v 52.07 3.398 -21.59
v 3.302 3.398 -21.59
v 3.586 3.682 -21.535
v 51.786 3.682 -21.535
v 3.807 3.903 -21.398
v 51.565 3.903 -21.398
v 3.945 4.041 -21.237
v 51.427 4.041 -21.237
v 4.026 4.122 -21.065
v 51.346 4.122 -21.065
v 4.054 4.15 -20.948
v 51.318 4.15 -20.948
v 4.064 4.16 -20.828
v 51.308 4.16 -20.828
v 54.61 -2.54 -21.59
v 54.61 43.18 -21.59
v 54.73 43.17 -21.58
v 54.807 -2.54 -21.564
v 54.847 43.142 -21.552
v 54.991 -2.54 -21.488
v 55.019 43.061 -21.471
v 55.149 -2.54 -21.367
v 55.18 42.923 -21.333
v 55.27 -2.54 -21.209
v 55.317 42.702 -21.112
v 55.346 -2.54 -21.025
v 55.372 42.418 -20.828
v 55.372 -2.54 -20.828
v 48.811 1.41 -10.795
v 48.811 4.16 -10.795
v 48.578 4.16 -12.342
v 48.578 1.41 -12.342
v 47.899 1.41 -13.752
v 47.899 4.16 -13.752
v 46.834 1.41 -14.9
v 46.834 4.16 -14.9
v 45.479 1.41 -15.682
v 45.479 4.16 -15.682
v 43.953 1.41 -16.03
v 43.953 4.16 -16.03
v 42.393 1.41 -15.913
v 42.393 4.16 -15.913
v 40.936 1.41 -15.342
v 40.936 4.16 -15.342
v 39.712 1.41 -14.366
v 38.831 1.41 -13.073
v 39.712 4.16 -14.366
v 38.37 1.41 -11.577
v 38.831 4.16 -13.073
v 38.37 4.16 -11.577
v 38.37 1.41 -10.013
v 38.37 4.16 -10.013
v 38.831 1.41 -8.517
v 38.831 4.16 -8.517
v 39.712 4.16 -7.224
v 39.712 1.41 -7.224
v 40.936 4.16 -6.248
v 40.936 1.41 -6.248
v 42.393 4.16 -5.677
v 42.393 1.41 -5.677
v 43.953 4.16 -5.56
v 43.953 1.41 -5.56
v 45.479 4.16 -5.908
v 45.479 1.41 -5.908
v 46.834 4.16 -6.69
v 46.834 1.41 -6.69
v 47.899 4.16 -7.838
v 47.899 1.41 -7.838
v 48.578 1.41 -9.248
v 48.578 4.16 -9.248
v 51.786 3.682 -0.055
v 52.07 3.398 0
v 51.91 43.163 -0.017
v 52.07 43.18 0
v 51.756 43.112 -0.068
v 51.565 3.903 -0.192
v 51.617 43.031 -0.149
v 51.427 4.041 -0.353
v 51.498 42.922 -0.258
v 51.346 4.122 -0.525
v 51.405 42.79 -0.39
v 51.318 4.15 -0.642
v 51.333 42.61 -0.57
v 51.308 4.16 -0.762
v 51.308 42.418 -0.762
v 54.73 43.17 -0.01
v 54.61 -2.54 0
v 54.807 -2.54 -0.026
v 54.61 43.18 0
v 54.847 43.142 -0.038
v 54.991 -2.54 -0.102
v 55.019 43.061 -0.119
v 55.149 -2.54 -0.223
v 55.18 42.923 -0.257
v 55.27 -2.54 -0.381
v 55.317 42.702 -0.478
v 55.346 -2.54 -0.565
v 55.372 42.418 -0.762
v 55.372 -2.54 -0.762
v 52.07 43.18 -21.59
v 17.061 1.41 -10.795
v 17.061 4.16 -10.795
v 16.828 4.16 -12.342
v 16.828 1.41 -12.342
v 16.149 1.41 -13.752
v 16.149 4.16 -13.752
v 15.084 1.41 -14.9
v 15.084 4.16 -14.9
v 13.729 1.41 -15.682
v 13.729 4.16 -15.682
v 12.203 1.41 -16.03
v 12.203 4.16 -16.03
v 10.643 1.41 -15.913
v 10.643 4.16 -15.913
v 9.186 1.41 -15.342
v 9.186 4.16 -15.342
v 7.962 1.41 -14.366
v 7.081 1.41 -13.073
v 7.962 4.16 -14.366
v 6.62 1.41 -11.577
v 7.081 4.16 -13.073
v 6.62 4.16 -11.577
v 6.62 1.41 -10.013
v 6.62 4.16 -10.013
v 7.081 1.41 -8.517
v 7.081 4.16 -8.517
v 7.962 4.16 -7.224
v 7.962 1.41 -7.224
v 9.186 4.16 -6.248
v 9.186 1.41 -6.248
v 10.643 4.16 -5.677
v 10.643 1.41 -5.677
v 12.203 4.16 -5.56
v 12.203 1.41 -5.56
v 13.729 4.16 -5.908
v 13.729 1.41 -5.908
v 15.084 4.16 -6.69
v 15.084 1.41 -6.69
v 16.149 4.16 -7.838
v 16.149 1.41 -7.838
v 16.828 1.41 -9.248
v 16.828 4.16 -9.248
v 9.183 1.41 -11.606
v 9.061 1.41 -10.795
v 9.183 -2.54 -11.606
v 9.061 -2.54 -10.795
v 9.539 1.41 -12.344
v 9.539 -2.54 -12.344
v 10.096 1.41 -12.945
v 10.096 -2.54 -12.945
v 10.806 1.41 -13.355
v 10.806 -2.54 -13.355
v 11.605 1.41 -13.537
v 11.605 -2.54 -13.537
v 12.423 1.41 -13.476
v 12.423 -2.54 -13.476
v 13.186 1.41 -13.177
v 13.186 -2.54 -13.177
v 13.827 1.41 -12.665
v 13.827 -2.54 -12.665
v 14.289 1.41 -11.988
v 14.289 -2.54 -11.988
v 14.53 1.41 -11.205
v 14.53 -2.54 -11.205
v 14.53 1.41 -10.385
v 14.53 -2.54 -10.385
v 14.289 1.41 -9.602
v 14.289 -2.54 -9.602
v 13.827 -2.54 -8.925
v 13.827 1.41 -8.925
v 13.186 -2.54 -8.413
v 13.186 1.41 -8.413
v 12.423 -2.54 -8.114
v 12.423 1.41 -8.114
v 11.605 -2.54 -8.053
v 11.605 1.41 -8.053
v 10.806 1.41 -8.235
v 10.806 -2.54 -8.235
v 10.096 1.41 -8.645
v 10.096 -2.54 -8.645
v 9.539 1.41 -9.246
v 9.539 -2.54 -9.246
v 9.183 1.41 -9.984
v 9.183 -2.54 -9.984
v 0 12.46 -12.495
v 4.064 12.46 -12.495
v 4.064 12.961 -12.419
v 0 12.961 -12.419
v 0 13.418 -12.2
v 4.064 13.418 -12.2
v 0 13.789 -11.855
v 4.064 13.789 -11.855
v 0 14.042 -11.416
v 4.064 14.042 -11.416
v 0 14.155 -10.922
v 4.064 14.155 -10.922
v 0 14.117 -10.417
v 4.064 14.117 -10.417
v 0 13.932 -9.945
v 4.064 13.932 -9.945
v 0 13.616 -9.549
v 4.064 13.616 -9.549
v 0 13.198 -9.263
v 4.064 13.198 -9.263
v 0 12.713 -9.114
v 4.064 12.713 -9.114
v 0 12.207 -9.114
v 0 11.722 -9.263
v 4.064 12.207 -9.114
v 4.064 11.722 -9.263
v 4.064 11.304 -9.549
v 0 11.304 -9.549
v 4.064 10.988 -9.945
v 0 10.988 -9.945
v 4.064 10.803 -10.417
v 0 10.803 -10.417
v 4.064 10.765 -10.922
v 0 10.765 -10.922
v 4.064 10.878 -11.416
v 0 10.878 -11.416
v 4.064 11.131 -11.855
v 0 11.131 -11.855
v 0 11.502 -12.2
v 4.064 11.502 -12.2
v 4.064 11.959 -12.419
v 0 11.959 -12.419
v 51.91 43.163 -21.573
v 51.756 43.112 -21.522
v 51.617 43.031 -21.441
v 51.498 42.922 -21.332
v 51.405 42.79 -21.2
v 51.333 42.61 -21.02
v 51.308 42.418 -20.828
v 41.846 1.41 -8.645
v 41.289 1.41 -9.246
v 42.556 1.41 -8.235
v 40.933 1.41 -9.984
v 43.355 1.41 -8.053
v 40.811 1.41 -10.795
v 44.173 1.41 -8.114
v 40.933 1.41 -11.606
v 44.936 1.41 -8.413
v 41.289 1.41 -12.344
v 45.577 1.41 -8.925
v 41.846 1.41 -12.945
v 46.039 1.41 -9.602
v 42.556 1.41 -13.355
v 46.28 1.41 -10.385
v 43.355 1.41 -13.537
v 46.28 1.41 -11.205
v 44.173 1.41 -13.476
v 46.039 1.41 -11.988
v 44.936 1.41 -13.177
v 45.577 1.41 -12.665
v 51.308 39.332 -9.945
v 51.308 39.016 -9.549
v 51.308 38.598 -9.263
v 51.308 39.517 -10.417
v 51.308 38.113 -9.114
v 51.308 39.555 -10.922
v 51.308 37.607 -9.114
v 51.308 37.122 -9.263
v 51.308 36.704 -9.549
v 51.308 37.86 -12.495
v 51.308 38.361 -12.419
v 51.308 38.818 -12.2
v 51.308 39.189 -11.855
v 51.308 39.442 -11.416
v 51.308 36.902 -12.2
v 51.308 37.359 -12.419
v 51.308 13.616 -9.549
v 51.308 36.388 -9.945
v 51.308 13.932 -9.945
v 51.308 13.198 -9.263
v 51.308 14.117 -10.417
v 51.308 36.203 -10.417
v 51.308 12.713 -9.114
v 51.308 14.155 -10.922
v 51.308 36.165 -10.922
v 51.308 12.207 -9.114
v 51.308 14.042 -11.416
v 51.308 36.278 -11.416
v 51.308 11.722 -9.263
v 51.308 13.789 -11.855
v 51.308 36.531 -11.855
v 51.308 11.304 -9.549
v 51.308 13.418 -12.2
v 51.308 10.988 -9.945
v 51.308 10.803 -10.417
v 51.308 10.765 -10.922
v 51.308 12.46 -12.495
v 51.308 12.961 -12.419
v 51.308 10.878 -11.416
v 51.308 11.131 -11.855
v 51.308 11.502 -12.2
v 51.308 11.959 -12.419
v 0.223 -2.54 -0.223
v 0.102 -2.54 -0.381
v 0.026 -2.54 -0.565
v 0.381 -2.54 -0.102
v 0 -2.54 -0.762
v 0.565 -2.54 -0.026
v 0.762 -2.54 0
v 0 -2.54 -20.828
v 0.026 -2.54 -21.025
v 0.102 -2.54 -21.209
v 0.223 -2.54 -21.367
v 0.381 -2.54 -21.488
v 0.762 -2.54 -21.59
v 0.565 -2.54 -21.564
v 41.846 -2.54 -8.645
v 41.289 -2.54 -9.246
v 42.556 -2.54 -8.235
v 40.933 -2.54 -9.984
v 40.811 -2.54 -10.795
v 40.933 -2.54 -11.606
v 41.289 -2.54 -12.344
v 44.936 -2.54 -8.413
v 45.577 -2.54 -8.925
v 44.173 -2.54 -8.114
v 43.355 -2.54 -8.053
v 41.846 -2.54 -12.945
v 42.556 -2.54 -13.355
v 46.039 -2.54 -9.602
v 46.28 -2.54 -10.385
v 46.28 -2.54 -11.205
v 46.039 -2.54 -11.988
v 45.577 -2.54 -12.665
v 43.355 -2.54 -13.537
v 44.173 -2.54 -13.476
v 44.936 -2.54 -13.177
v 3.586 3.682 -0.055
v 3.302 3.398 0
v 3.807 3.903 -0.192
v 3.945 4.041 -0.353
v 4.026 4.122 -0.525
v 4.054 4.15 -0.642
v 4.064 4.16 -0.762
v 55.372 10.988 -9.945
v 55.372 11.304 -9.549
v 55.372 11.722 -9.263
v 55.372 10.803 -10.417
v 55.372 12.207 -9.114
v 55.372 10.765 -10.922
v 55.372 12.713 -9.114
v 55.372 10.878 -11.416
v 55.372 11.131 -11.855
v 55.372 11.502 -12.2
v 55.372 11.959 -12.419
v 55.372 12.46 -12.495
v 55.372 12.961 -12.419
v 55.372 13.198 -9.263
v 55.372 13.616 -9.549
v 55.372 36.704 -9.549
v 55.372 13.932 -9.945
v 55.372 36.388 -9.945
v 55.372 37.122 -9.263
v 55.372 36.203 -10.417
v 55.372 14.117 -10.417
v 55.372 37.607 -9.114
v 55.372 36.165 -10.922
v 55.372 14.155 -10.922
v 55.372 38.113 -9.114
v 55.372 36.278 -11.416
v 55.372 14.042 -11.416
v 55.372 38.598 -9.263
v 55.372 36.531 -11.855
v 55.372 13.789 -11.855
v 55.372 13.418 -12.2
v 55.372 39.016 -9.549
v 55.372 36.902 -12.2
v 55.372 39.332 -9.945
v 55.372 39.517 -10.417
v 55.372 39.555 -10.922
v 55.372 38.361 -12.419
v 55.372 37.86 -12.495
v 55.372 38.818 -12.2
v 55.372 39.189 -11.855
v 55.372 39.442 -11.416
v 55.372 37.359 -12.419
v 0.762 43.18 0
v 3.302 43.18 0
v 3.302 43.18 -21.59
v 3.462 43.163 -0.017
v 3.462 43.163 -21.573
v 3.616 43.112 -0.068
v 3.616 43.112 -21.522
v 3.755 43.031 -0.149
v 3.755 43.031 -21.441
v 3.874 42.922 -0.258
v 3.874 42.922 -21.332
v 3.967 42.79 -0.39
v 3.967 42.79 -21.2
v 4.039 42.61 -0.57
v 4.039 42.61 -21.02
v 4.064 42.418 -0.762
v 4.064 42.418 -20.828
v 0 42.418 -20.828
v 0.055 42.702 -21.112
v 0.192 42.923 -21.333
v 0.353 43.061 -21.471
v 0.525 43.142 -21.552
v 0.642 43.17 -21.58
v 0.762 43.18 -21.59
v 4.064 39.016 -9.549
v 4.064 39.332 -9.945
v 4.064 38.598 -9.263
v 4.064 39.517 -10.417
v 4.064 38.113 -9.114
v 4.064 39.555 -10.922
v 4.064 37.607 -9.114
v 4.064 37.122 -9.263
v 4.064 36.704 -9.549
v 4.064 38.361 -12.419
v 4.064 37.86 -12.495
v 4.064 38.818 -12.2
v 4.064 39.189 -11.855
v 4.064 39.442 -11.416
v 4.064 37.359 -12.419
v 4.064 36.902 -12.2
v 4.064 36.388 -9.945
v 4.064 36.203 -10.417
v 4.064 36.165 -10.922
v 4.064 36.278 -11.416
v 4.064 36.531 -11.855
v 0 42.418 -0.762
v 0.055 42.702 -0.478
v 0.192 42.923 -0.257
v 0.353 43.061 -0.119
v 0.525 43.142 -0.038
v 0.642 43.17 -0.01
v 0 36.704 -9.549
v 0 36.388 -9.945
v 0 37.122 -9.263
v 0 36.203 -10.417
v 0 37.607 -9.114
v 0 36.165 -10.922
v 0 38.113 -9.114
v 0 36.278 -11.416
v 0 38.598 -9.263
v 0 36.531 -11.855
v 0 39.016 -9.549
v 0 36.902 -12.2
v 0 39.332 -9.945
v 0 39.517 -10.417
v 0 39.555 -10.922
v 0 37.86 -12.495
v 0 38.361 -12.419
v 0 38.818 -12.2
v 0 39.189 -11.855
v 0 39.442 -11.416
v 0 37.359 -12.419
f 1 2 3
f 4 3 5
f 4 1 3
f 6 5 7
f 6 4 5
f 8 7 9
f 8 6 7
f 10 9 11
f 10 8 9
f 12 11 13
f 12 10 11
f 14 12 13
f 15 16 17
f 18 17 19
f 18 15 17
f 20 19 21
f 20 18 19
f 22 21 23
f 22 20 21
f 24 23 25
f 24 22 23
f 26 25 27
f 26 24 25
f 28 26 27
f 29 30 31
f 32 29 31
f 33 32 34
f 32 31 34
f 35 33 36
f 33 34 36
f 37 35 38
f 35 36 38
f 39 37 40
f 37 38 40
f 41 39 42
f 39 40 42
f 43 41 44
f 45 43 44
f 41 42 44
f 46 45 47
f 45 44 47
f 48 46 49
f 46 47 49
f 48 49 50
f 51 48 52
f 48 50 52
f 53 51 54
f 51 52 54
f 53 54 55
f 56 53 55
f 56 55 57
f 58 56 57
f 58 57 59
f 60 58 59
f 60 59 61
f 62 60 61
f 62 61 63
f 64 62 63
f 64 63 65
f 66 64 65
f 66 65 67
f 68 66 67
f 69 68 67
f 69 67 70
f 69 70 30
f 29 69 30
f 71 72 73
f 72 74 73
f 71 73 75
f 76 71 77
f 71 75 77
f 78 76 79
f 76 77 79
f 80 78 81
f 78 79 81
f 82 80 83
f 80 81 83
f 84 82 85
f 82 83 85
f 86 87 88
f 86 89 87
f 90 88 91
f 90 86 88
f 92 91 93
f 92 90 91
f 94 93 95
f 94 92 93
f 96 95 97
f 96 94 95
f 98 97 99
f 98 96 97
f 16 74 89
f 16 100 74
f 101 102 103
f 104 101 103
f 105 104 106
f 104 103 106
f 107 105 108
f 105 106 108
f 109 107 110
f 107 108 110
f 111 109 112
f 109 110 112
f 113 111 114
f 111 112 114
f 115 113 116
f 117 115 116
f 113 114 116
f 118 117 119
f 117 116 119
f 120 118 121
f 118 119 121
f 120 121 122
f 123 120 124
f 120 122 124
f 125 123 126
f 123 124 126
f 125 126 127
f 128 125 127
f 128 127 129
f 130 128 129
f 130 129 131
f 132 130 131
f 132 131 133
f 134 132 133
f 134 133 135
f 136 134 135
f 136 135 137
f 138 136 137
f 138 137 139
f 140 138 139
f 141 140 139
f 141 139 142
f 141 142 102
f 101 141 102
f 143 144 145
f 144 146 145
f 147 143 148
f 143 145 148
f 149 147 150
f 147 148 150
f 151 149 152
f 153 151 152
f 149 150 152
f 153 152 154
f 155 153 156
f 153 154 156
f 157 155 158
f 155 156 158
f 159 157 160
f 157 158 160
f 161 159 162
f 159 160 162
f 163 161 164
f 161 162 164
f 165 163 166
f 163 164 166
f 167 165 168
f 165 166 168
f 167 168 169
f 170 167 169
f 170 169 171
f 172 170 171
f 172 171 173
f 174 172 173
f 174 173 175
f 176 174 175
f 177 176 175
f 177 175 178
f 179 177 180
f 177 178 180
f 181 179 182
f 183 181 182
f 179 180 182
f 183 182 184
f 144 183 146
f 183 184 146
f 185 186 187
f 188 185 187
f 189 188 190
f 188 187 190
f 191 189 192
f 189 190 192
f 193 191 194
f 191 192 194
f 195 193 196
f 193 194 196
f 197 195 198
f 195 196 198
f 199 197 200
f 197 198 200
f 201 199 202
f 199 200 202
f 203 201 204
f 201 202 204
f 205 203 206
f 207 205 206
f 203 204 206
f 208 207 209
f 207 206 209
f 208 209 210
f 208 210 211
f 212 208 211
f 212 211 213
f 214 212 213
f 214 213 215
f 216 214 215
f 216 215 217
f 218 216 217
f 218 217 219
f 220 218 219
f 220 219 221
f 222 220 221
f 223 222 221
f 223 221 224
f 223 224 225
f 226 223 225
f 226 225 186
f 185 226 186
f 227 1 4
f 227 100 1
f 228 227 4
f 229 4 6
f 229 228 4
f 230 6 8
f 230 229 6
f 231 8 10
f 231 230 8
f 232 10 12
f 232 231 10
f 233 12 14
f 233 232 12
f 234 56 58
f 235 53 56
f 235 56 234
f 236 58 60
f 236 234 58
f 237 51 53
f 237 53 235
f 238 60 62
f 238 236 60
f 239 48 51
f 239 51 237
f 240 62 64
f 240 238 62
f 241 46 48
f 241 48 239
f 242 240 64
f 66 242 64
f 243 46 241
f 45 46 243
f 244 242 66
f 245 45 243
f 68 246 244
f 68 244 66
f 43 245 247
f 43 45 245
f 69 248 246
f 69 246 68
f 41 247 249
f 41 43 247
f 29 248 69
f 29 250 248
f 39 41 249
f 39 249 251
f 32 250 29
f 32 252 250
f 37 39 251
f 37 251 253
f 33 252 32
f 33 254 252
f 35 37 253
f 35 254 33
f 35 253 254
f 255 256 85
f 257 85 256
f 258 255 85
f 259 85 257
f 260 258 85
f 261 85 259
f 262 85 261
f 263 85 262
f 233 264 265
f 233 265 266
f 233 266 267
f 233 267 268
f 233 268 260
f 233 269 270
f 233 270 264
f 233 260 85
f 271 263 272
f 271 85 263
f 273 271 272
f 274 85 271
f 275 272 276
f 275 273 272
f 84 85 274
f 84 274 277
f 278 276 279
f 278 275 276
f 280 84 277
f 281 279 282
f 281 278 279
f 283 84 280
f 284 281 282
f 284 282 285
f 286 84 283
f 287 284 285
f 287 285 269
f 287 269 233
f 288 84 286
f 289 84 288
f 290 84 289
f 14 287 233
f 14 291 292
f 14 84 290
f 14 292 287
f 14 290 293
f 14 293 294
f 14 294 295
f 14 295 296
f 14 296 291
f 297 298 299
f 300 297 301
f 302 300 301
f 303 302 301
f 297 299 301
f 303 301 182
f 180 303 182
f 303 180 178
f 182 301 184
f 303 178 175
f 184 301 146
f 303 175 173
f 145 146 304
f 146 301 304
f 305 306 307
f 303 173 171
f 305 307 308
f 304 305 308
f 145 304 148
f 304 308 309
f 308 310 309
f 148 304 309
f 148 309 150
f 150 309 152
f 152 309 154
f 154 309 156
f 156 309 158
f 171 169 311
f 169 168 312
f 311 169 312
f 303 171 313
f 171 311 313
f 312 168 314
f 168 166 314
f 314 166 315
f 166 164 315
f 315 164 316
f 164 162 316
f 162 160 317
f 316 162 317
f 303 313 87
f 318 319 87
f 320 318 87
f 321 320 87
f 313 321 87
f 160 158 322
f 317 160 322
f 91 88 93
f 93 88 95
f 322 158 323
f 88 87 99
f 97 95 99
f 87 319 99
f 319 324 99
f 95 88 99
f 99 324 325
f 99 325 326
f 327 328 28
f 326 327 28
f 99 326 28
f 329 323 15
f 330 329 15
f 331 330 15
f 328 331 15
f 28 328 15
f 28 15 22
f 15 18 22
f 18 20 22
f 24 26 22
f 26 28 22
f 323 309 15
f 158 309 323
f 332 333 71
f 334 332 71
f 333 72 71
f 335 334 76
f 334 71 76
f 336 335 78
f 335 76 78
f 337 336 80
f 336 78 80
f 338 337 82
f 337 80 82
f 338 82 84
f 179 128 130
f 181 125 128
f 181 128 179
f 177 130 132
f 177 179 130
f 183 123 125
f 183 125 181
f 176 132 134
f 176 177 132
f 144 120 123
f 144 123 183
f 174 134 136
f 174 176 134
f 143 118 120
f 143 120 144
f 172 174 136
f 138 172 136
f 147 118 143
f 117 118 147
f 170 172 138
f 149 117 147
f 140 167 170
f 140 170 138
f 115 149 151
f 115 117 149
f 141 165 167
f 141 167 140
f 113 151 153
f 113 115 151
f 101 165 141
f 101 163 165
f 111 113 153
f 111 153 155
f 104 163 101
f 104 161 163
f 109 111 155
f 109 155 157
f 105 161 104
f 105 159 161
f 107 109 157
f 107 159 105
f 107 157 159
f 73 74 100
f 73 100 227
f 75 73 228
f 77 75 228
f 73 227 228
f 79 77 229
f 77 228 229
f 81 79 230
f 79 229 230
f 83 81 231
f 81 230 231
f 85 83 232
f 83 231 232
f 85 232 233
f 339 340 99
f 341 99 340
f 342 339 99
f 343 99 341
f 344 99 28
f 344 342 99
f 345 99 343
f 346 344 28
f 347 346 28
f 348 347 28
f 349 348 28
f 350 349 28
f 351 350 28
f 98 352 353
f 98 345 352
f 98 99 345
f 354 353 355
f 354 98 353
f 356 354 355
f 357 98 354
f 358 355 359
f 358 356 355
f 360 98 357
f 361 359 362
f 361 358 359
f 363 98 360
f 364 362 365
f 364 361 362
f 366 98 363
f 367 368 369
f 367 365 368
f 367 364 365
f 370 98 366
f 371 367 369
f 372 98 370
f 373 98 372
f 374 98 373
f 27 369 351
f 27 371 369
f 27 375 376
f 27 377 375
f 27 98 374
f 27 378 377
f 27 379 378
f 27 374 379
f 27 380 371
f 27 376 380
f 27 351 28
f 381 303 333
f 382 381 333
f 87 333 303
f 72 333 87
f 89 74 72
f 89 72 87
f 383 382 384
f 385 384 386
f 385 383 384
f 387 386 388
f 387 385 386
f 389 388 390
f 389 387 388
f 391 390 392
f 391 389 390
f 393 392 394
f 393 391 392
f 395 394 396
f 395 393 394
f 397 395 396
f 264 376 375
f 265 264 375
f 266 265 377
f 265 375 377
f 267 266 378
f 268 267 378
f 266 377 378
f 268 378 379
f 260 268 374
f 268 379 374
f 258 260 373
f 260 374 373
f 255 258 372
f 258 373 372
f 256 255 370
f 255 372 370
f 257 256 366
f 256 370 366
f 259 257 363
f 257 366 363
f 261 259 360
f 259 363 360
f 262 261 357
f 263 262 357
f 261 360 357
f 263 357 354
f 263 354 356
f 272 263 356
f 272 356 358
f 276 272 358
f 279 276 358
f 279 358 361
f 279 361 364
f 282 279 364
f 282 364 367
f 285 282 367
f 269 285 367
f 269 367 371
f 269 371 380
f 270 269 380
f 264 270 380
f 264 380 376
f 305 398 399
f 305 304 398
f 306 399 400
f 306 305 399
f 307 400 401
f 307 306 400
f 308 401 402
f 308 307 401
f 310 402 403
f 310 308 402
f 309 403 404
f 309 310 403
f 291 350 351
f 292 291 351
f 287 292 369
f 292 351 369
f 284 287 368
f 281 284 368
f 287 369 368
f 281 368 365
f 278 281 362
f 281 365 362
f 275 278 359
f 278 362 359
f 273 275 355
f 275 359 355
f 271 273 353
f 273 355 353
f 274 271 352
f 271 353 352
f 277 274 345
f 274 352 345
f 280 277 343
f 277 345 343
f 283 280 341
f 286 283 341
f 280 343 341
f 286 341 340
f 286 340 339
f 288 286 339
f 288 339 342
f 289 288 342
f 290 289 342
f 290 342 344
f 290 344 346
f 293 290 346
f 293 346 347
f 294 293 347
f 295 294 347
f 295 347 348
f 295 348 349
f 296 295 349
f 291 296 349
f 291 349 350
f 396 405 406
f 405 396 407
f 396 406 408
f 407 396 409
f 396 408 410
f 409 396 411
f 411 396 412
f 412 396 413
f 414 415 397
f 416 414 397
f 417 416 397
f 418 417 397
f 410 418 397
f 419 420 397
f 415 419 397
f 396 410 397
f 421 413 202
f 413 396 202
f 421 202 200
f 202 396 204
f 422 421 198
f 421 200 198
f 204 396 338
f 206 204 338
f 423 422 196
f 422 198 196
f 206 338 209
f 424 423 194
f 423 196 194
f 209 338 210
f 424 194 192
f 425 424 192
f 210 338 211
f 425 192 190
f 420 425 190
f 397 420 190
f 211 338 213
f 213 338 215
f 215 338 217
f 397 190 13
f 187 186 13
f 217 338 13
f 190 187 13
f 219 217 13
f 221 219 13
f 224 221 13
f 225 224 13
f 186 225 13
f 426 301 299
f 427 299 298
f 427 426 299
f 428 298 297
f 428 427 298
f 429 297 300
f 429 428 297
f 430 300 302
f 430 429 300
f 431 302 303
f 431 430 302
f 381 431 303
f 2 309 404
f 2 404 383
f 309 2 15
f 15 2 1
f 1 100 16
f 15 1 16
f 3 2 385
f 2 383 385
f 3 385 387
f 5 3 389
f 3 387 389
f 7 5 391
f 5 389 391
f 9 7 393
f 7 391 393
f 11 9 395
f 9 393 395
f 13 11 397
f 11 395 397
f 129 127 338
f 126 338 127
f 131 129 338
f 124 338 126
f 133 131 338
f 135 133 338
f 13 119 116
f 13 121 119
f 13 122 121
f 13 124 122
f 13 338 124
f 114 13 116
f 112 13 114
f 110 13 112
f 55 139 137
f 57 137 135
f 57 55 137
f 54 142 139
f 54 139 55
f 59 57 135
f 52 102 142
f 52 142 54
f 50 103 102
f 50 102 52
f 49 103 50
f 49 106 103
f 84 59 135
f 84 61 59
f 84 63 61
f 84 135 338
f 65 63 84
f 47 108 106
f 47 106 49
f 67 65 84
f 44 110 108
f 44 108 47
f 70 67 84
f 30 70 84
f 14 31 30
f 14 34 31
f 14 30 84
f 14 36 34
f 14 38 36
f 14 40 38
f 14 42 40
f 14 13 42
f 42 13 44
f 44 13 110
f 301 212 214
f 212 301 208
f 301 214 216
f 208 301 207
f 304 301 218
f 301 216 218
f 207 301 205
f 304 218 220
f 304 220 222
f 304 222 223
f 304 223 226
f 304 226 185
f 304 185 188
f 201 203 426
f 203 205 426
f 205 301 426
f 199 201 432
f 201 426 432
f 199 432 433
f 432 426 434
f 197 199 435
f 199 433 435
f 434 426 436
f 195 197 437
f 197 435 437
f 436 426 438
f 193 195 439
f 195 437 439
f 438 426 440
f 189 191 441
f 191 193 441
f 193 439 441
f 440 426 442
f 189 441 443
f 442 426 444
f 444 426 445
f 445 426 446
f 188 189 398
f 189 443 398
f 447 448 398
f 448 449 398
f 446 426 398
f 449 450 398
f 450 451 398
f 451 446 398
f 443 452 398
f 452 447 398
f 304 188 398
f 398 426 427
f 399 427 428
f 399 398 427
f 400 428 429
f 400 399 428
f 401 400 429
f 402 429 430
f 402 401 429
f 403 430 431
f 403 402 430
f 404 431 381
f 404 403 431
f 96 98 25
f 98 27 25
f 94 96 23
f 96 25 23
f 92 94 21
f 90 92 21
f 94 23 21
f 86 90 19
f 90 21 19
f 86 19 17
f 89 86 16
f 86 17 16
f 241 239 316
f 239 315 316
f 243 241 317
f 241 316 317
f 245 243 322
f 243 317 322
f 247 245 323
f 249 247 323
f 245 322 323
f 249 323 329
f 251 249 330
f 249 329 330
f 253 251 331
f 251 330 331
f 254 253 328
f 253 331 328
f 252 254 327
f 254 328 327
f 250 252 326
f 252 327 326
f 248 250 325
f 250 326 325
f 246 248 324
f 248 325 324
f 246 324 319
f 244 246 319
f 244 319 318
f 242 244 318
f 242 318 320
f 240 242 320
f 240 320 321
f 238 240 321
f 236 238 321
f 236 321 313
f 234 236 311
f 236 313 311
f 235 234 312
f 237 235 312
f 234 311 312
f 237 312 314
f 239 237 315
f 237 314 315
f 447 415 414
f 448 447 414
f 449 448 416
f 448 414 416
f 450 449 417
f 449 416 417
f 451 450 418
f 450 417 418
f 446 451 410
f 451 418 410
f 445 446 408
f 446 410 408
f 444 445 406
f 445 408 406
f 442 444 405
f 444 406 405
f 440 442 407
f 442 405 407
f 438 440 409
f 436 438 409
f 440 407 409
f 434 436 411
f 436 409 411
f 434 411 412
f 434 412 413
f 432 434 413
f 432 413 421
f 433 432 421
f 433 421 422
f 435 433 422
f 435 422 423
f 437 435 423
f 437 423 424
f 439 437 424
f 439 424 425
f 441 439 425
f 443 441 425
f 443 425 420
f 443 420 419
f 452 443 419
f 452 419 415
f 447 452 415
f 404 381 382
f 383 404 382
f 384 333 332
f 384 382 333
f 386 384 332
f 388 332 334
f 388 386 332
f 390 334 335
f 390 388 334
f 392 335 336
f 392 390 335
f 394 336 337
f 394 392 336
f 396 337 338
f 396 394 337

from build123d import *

# Parameters (mm, degrees)
SKETCH1_W                       = 55.372
SKETCH1_H                       = 21.59
BOSS_EXTRUDE1_DEPTH             = 4.1599866
SKETCH2_W                       = 4.064
SKETCH2_H                       = 21.59
BOSS_EXTRUDE2_DEPTH             = 39.0200134
M3_CLEARANCE_HOLE2_D            = 3.4
SKETCH1_2_W                     = 55.372
SKETCH1_2_H                     = 21.59
BOSS_EXTRUDE3_DEPTH             = 2.54
CBORE_FOR_M5_SBHCS1_D           = 5.5
CBORE_FOR_M5_SBHCS1_CBORE_D     = 10.5
CBORE_FOR_M5_SBHCS1_CBORE_DEPTH = 2.75
FILLET1_R                       = 0.762


with BuildPart() as part:
    # Sketch1 → Boss-Extrude1 (new body)
    with BuildSketch(Plane(origin=(0, 0, 0), x_dir=(1, 0, 0), z_dir=(0, 1, 0))):
        with Locations((27.686, 10.795)):
            Rectangle(SKETCH1_W, SKETCH1_H)
    extrude(amount=BOSS_EXTRUDE1_DEPTH)

    # Sketch2 → Boss-Extrude2 (add)
    with BuildSketch(Plane(origin=(0, 4.1599866, 0), x_dir=(1, 0, 0), z_dir=(0, 1, 0))):
        with Locations((2.032, 10.795)):
            Rectangle(SKETCH2_W, SKETCH2_H)
        with Locations((53.34, 10.795)):
            Rectangle(SKETCH2_W, SKETCH2_H)
    extrude(amount=BOSS_EXTRUDE2_DEPTH)

    # M3 Clearance Hole2 (through all)
    with Locations(Plane.ZY):
        with Locations((-10.795, 37.8599954), (-10.795, 12.4599954)):
            Hole(M3_CLEARANCE_HOLE2_D / 2)

    # Sketch1<2> → Boss-Extrude3 (add)
    with BuildSketch(Plane(origin=(0, 0, 0), x_dir=(1, 0, 0), z_dir=(0, 1, 0))):
        with Locations((27.686, 10.795)):
            Rectangle(SKETCH1_2_W, SKETCH1_2_H)
    extrude(amount=-BOSS_EXTRUDE3_DEPTH)

    # CBORE for M5 SBHCS1 (through all)
    with Locations(Plane(origin=(0, 4.1599866, 0), x_dir=(1, 0, 0), z_dir=(0, 1, 0))):
        with Locations((11.811, 10.795), (43.561, 10.795)):
            CounterBoreHole(CBORE_FOR_M5_SBHCS1_D / 2, CBORE_FOR_M5_SBHCS1_CBORE_D / 2, CBORE_FOR_M5_SBHCS1_CBORE_DEPTH)

    # Fillet1
    fillet1_edges = [part.edges().sort_by_distance(p)[0] for p in [
        (27.686, 4.1599866, 0),
        (4.064, 23.6699933, 0),
        (4.064, 23.6699933, -21.59),
        (0, 43.18, -10.795),
        (4.064, 43.18, -10.795),
        (27.686, 4.1599866, -21.59),
        (51.308, 23.6699933, -21.59),
        (51.308, 23.6699933, 0),
        (55.372, 43.18, -10.795),
        (51.308, 43.18, -10.795),
        (0, 20.32, -21.59),
        (55.372, 20.32, -21.59),
        (55.372, 20.32, 0),
        (0, 20.32, 0),
    ]]
    fillet(fillet1_edges, radius=FILLET1_R)


solid = part.part
